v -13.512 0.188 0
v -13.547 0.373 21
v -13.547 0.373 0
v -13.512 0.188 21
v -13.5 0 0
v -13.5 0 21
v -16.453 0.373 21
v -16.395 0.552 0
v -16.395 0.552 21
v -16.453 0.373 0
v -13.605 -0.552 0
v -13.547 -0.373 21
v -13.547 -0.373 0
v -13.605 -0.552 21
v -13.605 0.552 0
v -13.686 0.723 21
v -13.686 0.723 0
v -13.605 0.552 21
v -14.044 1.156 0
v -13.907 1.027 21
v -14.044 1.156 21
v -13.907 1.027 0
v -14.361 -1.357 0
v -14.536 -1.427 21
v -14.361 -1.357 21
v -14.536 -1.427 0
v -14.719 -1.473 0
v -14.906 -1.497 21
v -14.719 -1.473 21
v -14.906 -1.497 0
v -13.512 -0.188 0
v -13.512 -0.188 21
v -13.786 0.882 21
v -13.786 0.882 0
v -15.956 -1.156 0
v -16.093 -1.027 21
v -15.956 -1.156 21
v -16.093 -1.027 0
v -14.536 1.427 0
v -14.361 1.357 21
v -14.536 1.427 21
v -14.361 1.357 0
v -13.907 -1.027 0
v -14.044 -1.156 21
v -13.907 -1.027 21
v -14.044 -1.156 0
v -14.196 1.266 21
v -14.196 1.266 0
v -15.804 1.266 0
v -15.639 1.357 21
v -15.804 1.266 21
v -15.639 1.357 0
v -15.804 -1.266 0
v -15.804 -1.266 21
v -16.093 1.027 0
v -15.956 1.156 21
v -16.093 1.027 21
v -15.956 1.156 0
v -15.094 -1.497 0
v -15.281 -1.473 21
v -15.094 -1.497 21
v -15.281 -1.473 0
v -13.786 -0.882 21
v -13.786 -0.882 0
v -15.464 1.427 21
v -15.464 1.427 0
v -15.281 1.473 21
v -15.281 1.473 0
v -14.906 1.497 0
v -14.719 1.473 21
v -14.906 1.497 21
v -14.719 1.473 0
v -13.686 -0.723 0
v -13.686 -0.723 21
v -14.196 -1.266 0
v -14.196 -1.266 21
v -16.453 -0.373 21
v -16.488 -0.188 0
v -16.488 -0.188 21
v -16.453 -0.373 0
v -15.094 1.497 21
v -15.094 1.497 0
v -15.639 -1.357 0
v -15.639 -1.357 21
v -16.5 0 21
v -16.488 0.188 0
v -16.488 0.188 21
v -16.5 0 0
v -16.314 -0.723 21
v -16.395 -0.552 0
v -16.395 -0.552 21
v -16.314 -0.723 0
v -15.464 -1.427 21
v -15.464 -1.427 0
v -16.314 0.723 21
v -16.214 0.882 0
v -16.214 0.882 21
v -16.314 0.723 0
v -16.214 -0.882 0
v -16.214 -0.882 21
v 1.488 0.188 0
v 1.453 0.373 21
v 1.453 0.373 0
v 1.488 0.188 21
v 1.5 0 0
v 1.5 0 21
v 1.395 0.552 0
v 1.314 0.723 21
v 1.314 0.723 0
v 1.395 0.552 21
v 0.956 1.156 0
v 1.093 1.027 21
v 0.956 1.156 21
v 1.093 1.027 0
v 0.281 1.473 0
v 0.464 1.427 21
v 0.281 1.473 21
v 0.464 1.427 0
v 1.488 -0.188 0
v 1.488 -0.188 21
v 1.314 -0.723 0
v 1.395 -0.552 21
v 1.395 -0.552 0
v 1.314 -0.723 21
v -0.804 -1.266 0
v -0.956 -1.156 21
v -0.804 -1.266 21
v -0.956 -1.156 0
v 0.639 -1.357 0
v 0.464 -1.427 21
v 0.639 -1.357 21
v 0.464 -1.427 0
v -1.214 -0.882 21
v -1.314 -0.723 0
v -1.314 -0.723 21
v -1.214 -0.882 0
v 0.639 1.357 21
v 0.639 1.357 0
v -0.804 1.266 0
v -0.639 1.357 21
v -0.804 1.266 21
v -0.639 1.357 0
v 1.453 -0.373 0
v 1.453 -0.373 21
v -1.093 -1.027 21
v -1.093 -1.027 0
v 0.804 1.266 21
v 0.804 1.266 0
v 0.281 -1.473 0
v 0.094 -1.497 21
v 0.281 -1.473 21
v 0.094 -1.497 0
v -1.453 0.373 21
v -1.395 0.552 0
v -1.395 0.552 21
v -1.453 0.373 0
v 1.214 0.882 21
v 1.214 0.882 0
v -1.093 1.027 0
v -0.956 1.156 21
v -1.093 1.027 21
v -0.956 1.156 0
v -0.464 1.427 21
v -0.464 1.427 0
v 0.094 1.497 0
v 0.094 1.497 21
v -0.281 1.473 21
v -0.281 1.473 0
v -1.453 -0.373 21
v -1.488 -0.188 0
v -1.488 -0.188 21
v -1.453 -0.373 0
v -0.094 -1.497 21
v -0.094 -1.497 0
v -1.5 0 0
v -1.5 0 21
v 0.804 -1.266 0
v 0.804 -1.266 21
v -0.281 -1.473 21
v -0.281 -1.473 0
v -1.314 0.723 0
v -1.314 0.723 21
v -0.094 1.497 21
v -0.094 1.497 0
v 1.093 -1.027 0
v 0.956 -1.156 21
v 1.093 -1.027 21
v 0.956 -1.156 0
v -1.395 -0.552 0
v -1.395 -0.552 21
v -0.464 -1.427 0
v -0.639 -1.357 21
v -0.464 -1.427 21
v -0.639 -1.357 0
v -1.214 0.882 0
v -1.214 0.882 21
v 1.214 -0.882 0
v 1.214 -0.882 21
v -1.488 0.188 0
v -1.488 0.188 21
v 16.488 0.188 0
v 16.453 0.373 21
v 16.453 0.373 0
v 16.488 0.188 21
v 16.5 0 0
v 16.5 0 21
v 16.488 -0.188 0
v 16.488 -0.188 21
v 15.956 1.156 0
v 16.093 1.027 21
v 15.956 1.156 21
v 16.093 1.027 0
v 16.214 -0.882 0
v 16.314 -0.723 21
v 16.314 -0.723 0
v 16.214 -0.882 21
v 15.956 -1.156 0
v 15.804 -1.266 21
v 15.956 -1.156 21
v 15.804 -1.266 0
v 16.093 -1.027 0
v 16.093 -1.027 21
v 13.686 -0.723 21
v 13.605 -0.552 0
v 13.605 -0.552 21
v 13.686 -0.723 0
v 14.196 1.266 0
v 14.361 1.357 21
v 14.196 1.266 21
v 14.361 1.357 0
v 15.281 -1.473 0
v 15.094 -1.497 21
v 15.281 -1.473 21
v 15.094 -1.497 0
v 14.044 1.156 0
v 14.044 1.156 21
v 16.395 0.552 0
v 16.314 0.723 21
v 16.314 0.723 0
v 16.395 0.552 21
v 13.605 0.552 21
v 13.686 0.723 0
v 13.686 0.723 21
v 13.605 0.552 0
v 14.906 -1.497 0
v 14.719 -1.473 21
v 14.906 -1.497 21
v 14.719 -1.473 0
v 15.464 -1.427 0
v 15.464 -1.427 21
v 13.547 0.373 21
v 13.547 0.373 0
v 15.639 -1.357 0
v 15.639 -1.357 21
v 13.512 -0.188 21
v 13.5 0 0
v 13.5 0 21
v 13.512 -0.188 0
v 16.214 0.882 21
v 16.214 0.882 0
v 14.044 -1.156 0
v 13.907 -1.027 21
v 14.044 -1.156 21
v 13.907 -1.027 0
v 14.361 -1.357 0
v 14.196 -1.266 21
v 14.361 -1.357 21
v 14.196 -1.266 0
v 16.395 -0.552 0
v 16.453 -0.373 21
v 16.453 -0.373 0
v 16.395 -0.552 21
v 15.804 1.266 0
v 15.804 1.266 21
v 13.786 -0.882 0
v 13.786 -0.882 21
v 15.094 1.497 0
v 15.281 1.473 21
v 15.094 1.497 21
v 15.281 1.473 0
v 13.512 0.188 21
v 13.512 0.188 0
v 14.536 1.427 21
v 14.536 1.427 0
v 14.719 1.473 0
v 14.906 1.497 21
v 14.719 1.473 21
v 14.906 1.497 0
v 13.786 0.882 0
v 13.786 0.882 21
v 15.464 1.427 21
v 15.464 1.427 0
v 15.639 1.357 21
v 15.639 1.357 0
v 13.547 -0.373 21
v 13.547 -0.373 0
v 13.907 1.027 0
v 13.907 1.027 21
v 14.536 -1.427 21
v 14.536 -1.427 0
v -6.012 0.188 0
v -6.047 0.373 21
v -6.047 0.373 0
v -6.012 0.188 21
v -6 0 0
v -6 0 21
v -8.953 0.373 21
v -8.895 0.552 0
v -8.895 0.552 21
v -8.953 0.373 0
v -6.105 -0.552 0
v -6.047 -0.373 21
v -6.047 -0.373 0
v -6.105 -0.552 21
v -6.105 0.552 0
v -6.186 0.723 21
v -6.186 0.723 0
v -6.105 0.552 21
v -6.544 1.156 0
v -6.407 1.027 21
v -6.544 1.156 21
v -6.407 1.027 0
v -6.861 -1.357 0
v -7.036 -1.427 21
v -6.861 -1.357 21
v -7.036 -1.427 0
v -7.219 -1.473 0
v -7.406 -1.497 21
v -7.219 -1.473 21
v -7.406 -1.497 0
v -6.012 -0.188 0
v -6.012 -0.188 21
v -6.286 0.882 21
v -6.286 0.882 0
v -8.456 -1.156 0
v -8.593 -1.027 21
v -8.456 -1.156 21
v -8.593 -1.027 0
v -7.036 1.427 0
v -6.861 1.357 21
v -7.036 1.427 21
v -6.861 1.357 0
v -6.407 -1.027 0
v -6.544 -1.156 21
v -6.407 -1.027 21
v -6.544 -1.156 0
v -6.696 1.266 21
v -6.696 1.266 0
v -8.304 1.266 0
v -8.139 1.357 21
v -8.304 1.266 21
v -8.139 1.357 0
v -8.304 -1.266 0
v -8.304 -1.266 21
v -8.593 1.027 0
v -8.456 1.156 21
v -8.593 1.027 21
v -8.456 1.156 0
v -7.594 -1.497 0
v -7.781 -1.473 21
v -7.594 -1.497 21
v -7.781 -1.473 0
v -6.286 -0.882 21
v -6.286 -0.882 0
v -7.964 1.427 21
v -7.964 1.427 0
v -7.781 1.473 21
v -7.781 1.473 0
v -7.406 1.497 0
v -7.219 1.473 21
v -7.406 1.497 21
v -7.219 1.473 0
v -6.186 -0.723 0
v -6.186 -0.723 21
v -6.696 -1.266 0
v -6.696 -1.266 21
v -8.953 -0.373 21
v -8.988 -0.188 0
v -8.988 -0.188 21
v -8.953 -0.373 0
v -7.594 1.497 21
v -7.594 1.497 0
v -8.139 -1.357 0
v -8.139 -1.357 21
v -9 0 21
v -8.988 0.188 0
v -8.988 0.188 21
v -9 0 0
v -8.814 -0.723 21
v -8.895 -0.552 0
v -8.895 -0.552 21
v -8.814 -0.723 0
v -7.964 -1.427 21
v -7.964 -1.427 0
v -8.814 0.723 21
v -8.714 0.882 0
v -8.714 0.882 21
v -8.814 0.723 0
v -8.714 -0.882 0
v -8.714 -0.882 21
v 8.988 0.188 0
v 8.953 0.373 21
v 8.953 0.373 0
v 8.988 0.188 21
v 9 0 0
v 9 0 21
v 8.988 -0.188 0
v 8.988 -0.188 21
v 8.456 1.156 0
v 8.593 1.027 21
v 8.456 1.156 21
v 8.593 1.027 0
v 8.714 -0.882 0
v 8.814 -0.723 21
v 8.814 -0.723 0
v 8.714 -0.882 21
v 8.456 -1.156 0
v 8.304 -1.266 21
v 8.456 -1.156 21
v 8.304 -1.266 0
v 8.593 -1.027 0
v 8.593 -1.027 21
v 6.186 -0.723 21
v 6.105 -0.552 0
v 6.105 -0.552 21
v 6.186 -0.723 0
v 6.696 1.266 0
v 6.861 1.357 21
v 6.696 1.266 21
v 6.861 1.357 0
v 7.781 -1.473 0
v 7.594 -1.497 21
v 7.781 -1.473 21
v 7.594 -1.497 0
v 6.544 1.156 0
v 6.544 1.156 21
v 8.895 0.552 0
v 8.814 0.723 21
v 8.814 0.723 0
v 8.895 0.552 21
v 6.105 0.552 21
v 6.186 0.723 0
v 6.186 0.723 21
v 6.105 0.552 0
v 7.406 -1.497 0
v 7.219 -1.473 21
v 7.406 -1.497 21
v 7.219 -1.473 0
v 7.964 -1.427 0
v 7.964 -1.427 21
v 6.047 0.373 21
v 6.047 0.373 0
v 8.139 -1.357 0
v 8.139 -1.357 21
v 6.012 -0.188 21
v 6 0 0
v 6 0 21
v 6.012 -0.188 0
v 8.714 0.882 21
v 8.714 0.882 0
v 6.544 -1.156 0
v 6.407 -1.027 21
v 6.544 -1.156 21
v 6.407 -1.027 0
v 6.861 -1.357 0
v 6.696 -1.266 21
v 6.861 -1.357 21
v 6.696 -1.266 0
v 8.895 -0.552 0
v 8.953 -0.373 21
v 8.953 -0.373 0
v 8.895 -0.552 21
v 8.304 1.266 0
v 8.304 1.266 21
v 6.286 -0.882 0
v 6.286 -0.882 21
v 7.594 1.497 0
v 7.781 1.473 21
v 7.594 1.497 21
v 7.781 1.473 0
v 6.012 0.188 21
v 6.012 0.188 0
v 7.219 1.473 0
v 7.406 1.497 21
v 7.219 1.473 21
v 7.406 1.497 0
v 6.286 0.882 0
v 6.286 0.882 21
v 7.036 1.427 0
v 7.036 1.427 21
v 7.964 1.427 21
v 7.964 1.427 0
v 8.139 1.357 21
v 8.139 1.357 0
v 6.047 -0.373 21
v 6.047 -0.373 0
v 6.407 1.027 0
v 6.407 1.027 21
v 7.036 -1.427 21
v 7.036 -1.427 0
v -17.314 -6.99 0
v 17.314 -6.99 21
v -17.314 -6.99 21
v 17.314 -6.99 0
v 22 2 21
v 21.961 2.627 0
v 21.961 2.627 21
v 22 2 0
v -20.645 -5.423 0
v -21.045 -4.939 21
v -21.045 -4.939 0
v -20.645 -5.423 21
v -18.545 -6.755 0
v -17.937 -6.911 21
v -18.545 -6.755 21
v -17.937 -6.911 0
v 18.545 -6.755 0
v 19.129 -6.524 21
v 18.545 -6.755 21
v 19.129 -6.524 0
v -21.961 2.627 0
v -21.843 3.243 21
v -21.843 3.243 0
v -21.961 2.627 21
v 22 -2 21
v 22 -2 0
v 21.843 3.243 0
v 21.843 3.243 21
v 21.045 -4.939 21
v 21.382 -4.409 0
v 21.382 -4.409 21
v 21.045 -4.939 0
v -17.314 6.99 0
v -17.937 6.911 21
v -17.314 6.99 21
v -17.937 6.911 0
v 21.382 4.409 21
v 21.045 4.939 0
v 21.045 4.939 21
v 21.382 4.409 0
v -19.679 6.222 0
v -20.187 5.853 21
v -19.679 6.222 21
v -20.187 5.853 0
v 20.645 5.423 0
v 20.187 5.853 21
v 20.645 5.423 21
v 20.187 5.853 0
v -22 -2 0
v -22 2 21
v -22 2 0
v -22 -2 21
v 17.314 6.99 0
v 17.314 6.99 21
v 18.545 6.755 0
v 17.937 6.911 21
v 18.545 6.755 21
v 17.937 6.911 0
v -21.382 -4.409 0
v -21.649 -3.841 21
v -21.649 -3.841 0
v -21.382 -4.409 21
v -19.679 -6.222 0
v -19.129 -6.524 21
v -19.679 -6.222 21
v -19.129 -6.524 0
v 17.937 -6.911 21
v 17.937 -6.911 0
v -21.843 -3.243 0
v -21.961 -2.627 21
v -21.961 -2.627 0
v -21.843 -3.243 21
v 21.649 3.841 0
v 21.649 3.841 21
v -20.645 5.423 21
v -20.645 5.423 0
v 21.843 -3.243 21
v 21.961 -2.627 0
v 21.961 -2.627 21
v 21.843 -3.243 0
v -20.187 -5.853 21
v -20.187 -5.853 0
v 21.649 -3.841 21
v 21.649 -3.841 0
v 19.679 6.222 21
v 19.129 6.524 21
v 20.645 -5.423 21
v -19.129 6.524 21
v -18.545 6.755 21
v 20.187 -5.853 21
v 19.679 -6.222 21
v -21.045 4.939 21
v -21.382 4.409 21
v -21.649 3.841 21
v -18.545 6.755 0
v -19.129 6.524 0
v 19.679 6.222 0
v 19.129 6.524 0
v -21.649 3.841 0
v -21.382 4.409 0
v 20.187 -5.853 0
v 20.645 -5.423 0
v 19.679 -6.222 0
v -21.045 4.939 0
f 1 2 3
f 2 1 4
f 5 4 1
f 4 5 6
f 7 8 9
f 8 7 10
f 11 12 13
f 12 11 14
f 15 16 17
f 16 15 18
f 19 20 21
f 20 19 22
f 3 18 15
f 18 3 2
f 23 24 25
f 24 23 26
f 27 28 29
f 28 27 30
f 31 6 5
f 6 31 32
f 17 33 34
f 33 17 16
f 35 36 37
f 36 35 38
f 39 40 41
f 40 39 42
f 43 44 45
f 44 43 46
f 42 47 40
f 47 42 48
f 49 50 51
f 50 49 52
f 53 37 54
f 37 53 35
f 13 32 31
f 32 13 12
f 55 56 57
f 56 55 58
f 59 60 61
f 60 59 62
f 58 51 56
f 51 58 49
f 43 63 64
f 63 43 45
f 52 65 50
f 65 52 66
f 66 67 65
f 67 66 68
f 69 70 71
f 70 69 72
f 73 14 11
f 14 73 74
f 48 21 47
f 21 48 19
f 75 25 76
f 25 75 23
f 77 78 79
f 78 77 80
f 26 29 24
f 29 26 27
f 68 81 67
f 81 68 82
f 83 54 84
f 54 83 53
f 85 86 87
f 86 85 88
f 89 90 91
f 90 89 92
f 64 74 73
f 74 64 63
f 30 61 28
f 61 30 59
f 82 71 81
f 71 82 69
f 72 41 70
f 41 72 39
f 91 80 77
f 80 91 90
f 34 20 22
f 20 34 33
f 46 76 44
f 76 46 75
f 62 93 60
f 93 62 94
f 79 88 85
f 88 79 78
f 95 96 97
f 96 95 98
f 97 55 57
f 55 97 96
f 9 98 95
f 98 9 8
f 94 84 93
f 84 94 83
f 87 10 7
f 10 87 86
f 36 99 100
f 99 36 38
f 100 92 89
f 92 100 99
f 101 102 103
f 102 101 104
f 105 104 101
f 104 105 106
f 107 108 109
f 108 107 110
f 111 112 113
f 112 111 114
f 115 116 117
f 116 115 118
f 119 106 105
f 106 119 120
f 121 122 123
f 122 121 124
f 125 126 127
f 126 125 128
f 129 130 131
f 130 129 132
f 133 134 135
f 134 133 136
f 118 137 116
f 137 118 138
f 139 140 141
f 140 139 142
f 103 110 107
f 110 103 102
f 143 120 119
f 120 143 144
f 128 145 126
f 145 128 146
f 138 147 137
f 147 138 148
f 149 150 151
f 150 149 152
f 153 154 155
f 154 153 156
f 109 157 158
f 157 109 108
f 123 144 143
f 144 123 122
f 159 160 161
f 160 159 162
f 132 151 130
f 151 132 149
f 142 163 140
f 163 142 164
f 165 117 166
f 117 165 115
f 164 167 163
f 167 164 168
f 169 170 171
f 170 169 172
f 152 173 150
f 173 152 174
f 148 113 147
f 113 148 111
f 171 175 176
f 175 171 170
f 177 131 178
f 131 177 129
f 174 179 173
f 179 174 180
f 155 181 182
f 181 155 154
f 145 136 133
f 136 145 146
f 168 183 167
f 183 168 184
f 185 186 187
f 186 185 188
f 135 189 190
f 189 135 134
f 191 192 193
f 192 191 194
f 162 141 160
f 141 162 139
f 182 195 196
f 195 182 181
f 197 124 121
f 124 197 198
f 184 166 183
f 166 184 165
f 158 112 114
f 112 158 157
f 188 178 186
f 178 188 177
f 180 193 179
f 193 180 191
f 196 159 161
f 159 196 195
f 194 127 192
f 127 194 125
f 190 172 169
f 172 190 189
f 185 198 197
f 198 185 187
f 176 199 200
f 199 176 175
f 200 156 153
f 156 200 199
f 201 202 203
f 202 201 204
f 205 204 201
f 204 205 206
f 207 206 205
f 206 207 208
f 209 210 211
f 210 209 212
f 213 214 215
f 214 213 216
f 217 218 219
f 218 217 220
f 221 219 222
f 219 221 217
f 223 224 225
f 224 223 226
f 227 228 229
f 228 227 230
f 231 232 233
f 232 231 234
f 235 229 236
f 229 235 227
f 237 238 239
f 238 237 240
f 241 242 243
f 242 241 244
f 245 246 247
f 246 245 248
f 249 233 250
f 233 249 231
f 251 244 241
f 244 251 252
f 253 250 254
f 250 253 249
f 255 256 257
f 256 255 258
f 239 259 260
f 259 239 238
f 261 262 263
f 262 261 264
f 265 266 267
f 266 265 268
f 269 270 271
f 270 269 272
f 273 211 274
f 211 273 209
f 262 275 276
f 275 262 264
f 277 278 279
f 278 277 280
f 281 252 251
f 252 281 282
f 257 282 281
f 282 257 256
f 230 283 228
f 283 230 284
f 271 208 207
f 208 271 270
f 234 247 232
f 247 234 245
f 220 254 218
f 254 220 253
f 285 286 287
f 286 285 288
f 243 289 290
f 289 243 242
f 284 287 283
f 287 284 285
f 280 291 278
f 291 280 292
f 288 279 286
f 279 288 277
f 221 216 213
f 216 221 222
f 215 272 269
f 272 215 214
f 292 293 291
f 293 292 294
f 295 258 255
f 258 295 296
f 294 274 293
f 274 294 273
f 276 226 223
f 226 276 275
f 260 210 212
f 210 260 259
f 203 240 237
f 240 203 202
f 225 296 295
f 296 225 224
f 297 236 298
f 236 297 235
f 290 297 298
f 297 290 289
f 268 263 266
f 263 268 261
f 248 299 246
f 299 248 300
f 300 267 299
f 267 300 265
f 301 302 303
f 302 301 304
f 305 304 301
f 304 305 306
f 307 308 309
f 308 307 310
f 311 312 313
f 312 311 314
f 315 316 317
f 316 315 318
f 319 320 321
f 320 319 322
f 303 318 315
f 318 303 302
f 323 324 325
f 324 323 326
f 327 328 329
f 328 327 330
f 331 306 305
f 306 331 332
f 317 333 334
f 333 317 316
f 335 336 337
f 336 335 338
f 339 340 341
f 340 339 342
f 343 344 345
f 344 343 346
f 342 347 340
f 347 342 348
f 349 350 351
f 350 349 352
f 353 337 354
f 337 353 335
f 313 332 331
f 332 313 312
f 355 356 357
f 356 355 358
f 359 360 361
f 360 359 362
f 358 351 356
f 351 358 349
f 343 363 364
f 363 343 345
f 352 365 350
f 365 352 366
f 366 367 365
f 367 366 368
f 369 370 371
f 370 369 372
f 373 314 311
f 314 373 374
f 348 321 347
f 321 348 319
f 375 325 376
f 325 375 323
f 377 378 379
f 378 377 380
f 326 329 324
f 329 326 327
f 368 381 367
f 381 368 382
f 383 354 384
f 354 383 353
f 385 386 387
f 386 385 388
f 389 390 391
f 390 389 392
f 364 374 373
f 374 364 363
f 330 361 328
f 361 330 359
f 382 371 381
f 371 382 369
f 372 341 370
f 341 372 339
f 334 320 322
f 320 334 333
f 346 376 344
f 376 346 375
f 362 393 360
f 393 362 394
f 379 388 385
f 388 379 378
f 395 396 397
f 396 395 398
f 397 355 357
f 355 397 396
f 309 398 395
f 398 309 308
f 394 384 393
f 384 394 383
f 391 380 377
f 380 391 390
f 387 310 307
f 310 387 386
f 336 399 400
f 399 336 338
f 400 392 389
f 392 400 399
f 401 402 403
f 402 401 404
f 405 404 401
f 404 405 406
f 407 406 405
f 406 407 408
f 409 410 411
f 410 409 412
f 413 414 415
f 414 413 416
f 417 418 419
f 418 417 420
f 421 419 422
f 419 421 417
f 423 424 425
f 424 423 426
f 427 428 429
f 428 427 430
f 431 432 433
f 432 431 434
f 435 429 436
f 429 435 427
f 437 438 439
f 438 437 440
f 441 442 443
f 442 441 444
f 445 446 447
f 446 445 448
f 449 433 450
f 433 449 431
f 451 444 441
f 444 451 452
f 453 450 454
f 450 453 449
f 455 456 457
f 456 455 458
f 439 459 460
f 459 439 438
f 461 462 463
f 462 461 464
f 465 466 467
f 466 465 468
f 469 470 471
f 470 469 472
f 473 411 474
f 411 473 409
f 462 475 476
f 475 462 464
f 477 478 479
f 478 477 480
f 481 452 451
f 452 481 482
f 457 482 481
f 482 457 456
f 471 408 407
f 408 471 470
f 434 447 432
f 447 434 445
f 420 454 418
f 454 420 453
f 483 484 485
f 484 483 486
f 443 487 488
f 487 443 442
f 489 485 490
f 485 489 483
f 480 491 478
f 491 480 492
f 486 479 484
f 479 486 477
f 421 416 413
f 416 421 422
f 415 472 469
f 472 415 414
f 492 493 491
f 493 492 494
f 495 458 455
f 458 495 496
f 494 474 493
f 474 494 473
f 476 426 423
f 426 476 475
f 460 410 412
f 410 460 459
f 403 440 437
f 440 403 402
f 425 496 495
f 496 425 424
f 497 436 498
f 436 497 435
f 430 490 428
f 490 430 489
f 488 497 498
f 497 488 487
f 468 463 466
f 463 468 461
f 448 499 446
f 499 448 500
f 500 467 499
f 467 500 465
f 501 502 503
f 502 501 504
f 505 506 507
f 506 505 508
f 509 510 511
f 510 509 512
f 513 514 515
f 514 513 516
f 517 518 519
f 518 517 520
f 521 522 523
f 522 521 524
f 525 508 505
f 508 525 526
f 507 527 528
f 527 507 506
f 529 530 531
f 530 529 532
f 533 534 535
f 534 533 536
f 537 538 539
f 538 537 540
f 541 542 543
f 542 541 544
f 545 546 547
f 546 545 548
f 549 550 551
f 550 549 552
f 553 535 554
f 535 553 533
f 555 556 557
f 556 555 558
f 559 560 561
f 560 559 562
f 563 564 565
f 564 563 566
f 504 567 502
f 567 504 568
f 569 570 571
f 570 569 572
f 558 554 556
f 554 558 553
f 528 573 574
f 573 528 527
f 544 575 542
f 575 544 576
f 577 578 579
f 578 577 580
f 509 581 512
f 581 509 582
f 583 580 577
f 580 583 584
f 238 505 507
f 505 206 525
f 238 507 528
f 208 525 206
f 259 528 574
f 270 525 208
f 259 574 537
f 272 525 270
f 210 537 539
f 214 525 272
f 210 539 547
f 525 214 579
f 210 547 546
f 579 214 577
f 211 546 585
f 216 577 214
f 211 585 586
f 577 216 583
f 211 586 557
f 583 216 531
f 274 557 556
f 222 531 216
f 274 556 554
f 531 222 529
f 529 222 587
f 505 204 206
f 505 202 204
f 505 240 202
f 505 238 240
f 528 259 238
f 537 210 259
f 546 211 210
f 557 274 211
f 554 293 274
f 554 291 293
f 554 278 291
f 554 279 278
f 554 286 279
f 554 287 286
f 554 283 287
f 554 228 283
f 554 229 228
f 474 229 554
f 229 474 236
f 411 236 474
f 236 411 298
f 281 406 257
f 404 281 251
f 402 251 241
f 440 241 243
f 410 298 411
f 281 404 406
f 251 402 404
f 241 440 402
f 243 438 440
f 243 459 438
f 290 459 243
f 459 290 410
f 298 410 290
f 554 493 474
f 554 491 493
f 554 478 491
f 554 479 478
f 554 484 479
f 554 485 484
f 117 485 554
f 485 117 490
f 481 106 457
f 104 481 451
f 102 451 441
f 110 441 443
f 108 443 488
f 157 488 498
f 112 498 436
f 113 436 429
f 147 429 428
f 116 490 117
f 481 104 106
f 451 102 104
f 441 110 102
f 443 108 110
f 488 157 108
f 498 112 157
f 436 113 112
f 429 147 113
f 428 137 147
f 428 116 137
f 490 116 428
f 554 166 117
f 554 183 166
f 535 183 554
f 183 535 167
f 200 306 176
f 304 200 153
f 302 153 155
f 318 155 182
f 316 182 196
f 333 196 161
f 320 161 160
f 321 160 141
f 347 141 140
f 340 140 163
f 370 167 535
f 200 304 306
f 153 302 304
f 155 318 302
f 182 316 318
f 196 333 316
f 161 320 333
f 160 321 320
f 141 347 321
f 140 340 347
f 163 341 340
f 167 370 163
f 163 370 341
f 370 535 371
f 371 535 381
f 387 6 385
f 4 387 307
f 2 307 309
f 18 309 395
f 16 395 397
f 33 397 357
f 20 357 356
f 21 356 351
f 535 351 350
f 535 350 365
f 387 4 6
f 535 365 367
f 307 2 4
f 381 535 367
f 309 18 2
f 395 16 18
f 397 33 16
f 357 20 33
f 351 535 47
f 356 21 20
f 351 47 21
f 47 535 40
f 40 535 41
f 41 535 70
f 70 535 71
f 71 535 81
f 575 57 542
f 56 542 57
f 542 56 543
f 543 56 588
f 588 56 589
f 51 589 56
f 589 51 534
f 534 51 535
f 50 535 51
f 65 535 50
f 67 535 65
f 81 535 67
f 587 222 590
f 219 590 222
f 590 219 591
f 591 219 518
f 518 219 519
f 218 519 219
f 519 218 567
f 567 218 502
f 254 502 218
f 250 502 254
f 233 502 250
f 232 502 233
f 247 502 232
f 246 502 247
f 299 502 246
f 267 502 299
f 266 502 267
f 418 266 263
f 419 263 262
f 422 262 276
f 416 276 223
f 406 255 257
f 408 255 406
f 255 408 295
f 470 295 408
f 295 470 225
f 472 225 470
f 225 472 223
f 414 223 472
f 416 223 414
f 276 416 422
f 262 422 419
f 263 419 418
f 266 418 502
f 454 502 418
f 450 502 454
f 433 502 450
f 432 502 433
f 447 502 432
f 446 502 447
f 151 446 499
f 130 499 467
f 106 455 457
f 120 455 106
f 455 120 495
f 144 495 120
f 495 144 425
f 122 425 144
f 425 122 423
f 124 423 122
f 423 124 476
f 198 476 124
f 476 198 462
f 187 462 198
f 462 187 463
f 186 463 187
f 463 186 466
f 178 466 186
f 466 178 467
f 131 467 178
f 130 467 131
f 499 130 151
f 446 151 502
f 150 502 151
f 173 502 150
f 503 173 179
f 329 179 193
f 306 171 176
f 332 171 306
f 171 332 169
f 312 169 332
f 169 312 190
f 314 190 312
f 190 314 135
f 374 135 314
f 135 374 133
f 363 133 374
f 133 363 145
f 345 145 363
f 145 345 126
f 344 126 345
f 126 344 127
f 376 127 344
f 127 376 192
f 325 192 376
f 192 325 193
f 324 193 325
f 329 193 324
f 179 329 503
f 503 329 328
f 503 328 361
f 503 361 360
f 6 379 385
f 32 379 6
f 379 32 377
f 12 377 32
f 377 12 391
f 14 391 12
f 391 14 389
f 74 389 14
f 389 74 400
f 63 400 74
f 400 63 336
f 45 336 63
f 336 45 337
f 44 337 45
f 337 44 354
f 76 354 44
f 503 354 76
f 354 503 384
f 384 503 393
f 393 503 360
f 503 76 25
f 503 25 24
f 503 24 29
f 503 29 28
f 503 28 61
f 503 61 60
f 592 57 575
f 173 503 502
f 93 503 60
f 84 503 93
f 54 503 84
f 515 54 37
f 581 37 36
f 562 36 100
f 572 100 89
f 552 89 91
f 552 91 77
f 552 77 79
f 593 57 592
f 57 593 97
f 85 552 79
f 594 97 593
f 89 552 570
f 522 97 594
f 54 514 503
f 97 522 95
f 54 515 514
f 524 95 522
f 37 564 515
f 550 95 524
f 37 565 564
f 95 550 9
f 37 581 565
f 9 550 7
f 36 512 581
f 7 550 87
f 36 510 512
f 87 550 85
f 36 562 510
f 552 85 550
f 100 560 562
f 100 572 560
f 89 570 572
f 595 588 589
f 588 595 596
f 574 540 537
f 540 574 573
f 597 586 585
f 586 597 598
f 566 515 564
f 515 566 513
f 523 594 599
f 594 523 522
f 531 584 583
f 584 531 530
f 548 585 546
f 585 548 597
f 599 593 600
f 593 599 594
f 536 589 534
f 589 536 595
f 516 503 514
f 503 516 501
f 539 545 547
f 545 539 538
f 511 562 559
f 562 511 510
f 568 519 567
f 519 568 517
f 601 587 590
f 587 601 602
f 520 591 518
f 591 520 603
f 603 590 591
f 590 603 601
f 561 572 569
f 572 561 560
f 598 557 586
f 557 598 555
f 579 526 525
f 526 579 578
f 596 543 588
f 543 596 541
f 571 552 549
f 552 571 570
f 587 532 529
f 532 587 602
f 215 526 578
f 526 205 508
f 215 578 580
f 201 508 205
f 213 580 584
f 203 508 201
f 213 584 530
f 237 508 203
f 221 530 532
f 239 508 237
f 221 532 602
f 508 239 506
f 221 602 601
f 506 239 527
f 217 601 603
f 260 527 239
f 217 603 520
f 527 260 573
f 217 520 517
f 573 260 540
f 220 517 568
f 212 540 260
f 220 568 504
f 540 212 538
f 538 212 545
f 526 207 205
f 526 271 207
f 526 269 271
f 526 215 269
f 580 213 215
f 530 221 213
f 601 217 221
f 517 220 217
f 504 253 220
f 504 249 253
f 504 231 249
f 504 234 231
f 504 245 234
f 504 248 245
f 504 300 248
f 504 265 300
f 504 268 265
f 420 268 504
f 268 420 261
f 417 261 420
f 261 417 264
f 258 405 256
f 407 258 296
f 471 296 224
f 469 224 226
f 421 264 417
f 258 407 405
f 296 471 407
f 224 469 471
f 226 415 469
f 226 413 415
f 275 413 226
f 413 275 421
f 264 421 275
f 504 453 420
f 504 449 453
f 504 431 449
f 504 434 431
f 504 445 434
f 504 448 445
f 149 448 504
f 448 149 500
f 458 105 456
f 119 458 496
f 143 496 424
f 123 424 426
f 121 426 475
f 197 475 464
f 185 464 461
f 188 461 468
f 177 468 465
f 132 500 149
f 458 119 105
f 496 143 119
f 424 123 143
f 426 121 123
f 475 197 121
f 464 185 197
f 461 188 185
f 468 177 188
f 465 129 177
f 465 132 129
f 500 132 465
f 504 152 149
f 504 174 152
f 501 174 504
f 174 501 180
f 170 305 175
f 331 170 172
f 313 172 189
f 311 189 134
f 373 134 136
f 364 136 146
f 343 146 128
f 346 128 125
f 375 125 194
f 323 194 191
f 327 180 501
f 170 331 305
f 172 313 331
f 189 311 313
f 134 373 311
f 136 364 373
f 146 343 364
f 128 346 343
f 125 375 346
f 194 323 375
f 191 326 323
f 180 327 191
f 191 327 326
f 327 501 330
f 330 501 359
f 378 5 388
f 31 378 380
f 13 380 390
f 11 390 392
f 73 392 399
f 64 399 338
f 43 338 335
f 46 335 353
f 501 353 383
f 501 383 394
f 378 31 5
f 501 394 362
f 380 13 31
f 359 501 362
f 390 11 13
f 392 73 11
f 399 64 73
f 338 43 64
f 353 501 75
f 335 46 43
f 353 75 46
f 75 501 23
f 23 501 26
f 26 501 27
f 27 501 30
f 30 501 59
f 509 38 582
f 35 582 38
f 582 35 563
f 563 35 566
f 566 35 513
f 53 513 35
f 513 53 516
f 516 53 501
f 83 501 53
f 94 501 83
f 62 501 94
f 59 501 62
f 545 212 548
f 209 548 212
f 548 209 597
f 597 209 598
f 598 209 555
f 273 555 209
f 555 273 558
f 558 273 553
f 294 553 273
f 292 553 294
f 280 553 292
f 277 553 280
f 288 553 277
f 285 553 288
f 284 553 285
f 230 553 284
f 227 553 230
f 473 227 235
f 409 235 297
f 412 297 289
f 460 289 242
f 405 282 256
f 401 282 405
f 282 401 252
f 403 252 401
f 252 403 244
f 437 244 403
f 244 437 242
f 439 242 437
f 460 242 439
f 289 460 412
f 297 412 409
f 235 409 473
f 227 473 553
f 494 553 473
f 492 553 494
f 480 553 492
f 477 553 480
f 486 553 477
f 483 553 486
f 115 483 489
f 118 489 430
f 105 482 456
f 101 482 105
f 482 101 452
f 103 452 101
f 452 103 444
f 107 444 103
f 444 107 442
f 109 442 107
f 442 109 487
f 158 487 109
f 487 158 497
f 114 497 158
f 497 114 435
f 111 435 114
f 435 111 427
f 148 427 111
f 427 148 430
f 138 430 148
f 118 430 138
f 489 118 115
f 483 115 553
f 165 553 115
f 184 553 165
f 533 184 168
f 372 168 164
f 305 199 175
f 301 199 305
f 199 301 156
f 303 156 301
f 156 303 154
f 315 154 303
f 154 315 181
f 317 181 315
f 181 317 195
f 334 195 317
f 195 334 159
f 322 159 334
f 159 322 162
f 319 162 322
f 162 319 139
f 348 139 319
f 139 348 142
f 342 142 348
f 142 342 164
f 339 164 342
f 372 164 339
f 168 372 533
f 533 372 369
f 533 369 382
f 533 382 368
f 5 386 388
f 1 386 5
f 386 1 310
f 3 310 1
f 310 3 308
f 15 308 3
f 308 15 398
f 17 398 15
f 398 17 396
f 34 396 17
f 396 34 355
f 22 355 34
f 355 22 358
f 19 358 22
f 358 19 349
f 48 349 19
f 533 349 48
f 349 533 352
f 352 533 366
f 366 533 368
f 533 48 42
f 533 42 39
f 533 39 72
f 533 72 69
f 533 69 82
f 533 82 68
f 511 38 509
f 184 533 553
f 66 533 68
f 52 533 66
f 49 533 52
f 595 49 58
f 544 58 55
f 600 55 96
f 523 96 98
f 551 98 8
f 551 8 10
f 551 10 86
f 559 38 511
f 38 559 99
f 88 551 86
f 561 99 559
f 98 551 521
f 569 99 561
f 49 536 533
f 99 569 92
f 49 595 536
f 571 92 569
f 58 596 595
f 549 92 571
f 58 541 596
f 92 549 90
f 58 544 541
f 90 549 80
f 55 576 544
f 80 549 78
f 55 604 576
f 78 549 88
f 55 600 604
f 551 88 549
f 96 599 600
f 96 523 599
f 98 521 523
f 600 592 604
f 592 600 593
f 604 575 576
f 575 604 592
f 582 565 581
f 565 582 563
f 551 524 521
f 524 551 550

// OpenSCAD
$fn = 50;


difference() {
	union() {
		hull() {
			translate(v = [-17.0000000000, 2.0000000000, 0]) {
				cylinder(h = 21, r = 5);
			}
			translate(v = [17.0000000000, 2.0000000000, 0]) {
				cylinder(h = 21, r = 5);
			}
			translate(v = [-17.0000000000, -2.0000000000, 0]) {
				cylinder(h = 21, r = 5);
			}
			translate(v = [17.0000000000, -2.0000000000, 0]) {
				cylinder(h = 21, r = 5);
			}
		}
	}
	union() {
		translate(v = [-15.0000000000, 0.0000000000, 0]) {
			translate(v = [0, 0, -100]) {
				cylinder(h = 200, r = 1.5000000000);
			}
		}
		translate(v = [0, 0, -100]) {
			cylinder(h = 200, r = 1.5000000000);
		}
		translate(v = [15.0000000000, 0.0000000000, 0]) {
			translate(v = [0, 0, -100]) {
				cylinder(h = 200, r = 1.5000000000);
			}
		}
		translate(v = [-15.0000000000, 0.0000000000, 0]) {
			translate(v = [0, 0, -100]) {
				cylinder(h = 200, r = 1.5000000000);
			}
		}
		translate(v = [-7.5000000000, 0.0000000000, 0]) {
			translate(v = [0, 0, -100]) {
				cylinder(h = 200, r = 1.5000000000);
			}
		}
		translate(v = [0, 0, -100]) {
			cylinder(h = 200, r = 1.5000000000);
		}
		translate(v = [7.5000000000, 0.0000000000, 0]) {
			translate(v = [0, 0, -100]) {
				cylinder(h = 200, r = 1.5000000000);
			}
		}
		translate(v = [15.0000000000, 0.0000000000, 0]) {
			translate(v = [0, 0, -100]) {
				cylinder(h = 200, r = 1.5000000000);
			}
		}
	}
}
